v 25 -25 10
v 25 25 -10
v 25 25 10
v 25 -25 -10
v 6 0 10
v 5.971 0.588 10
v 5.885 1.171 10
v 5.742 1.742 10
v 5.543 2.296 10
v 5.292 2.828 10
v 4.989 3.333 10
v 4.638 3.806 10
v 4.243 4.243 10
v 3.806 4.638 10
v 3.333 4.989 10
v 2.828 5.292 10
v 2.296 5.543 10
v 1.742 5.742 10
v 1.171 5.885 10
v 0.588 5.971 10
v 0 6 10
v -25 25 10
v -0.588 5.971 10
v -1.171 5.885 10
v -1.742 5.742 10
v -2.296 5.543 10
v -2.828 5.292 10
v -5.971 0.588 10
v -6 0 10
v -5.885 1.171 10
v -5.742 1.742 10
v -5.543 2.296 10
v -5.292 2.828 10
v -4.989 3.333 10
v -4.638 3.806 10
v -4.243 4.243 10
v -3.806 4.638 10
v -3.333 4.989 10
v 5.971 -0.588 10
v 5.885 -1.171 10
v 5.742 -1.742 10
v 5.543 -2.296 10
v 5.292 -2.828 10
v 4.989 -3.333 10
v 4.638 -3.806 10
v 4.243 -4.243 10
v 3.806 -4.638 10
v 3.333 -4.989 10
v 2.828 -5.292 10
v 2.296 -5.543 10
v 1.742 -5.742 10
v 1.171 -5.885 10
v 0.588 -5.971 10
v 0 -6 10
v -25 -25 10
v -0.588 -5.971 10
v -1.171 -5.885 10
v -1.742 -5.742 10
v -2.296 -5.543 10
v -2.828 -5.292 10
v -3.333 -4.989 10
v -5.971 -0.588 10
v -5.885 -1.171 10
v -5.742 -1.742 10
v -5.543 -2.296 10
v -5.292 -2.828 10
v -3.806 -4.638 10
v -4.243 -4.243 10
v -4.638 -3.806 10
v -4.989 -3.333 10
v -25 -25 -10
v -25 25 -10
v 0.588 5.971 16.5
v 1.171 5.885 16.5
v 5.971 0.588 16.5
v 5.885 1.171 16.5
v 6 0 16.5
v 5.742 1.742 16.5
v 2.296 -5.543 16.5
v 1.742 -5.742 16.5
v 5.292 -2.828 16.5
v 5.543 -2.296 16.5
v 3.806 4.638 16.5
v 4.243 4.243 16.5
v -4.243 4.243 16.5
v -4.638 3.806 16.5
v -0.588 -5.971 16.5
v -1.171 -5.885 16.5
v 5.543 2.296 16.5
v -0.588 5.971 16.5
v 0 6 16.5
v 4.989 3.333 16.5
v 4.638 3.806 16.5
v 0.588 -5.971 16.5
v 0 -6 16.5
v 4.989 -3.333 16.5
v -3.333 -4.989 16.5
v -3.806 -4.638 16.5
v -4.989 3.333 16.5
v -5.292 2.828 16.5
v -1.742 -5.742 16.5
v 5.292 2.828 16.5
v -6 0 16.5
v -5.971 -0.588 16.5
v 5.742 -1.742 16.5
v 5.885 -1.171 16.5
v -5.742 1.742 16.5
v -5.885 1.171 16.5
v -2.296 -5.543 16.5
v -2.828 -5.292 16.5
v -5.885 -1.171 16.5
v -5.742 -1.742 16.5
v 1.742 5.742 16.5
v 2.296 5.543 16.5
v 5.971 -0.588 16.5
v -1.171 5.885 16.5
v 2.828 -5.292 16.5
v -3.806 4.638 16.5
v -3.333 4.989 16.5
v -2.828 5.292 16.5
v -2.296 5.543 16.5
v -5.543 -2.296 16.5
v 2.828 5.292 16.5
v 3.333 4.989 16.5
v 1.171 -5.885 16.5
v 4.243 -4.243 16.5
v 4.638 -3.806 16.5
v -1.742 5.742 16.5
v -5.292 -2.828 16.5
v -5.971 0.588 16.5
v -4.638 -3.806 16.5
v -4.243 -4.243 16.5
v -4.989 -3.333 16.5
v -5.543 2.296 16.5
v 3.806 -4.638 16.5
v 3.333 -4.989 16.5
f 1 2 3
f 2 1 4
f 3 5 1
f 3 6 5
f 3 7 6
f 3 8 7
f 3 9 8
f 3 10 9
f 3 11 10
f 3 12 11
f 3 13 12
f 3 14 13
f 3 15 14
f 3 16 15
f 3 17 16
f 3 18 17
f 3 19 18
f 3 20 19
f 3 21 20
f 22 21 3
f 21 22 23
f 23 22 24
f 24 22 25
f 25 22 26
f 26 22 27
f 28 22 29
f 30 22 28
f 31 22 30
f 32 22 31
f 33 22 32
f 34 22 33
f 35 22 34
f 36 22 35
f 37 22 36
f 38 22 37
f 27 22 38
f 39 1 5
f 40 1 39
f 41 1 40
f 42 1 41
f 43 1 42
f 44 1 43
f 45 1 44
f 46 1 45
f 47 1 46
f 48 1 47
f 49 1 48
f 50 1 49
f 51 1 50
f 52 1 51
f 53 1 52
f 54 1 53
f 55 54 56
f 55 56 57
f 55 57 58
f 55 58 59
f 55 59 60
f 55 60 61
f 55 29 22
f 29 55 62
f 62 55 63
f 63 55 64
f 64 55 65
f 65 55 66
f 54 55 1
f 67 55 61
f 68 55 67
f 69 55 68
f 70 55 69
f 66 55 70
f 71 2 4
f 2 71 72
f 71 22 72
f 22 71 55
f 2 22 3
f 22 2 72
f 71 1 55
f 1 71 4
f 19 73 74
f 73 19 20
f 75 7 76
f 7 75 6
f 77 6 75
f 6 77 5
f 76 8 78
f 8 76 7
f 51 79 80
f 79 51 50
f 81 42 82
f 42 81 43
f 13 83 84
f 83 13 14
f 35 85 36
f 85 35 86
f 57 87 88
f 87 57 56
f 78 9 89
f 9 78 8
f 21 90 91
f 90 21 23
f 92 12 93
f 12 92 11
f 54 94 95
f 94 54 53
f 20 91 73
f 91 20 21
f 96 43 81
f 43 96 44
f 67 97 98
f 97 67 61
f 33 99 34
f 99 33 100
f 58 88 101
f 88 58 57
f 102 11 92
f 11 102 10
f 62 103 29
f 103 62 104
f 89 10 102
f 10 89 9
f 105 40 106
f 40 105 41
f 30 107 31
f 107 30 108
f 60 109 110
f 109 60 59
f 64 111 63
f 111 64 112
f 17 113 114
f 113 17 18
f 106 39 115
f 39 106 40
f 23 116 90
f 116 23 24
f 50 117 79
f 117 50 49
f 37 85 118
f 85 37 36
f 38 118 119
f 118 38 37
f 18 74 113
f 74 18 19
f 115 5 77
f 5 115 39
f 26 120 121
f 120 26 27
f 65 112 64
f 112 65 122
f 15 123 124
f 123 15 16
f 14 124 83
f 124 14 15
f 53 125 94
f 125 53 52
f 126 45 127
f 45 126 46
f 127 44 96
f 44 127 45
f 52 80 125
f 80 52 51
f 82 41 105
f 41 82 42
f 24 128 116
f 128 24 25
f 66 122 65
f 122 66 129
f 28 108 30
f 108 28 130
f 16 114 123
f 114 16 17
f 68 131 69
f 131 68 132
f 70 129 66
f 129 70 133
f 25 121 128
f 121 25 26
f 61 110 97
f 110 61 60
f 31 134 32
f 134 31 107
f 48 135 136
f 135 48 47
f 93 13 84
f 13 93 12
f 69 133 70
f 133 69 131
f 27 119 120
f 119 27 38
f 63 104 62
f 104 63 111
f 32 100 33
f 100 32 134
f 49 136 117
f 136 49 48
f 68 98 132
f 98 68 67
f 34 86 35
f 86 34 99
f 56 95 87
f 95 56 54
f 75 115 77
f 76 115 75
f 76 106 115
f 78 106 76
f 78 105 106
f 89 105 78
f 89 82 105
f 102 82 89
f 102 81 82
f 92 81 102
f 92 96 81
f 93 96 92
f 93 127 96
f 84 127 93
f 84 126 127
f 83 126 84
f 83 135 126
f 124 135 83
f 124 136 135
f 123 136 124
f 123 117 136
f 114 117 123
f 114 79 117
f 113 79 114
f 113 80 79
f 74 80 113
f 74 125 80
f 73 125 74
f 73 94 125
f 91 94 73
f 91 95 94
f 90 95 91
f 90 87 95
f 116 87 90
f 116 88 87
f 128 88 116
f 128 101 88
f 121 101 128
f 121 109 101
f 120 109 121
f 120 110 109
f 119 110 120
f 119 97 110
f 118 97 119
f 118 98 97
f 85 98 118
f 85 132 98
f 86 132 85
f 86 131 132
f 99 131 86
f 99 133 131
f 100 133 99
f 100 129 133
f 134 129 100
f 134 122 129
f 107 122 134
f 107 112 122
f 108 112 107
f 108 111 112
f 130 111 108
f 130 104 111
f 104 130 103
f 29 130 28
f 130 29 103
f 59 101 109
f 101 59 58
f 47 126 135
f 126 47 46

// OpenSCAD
// Parameters
body_L = 50; //[25:100:1]
body_W = 50; //[25:100:1]
body_H = 20; //[10:40:1]

// Small overlap to guarantee a single connected solid
overlap = 0.5;

// Main body module
module main_body() {
  cube([body_L, body_W, body_H], center=true);
}

// Final model: one solid, non-degenerate, visible geometry
union() {
  main_body();

  // External boss on top face (clearly visible and connected with overlap)
  boss_r = min(body_L, body_W) * 0.12;
  boss_h = max(2, body_H * 0.35);

  translate([0, 0, body_H/2 + boss_h/2 - overlap])
    cylinder(r=boss_r, h=boss_h, center=true, $fn=64);
}
